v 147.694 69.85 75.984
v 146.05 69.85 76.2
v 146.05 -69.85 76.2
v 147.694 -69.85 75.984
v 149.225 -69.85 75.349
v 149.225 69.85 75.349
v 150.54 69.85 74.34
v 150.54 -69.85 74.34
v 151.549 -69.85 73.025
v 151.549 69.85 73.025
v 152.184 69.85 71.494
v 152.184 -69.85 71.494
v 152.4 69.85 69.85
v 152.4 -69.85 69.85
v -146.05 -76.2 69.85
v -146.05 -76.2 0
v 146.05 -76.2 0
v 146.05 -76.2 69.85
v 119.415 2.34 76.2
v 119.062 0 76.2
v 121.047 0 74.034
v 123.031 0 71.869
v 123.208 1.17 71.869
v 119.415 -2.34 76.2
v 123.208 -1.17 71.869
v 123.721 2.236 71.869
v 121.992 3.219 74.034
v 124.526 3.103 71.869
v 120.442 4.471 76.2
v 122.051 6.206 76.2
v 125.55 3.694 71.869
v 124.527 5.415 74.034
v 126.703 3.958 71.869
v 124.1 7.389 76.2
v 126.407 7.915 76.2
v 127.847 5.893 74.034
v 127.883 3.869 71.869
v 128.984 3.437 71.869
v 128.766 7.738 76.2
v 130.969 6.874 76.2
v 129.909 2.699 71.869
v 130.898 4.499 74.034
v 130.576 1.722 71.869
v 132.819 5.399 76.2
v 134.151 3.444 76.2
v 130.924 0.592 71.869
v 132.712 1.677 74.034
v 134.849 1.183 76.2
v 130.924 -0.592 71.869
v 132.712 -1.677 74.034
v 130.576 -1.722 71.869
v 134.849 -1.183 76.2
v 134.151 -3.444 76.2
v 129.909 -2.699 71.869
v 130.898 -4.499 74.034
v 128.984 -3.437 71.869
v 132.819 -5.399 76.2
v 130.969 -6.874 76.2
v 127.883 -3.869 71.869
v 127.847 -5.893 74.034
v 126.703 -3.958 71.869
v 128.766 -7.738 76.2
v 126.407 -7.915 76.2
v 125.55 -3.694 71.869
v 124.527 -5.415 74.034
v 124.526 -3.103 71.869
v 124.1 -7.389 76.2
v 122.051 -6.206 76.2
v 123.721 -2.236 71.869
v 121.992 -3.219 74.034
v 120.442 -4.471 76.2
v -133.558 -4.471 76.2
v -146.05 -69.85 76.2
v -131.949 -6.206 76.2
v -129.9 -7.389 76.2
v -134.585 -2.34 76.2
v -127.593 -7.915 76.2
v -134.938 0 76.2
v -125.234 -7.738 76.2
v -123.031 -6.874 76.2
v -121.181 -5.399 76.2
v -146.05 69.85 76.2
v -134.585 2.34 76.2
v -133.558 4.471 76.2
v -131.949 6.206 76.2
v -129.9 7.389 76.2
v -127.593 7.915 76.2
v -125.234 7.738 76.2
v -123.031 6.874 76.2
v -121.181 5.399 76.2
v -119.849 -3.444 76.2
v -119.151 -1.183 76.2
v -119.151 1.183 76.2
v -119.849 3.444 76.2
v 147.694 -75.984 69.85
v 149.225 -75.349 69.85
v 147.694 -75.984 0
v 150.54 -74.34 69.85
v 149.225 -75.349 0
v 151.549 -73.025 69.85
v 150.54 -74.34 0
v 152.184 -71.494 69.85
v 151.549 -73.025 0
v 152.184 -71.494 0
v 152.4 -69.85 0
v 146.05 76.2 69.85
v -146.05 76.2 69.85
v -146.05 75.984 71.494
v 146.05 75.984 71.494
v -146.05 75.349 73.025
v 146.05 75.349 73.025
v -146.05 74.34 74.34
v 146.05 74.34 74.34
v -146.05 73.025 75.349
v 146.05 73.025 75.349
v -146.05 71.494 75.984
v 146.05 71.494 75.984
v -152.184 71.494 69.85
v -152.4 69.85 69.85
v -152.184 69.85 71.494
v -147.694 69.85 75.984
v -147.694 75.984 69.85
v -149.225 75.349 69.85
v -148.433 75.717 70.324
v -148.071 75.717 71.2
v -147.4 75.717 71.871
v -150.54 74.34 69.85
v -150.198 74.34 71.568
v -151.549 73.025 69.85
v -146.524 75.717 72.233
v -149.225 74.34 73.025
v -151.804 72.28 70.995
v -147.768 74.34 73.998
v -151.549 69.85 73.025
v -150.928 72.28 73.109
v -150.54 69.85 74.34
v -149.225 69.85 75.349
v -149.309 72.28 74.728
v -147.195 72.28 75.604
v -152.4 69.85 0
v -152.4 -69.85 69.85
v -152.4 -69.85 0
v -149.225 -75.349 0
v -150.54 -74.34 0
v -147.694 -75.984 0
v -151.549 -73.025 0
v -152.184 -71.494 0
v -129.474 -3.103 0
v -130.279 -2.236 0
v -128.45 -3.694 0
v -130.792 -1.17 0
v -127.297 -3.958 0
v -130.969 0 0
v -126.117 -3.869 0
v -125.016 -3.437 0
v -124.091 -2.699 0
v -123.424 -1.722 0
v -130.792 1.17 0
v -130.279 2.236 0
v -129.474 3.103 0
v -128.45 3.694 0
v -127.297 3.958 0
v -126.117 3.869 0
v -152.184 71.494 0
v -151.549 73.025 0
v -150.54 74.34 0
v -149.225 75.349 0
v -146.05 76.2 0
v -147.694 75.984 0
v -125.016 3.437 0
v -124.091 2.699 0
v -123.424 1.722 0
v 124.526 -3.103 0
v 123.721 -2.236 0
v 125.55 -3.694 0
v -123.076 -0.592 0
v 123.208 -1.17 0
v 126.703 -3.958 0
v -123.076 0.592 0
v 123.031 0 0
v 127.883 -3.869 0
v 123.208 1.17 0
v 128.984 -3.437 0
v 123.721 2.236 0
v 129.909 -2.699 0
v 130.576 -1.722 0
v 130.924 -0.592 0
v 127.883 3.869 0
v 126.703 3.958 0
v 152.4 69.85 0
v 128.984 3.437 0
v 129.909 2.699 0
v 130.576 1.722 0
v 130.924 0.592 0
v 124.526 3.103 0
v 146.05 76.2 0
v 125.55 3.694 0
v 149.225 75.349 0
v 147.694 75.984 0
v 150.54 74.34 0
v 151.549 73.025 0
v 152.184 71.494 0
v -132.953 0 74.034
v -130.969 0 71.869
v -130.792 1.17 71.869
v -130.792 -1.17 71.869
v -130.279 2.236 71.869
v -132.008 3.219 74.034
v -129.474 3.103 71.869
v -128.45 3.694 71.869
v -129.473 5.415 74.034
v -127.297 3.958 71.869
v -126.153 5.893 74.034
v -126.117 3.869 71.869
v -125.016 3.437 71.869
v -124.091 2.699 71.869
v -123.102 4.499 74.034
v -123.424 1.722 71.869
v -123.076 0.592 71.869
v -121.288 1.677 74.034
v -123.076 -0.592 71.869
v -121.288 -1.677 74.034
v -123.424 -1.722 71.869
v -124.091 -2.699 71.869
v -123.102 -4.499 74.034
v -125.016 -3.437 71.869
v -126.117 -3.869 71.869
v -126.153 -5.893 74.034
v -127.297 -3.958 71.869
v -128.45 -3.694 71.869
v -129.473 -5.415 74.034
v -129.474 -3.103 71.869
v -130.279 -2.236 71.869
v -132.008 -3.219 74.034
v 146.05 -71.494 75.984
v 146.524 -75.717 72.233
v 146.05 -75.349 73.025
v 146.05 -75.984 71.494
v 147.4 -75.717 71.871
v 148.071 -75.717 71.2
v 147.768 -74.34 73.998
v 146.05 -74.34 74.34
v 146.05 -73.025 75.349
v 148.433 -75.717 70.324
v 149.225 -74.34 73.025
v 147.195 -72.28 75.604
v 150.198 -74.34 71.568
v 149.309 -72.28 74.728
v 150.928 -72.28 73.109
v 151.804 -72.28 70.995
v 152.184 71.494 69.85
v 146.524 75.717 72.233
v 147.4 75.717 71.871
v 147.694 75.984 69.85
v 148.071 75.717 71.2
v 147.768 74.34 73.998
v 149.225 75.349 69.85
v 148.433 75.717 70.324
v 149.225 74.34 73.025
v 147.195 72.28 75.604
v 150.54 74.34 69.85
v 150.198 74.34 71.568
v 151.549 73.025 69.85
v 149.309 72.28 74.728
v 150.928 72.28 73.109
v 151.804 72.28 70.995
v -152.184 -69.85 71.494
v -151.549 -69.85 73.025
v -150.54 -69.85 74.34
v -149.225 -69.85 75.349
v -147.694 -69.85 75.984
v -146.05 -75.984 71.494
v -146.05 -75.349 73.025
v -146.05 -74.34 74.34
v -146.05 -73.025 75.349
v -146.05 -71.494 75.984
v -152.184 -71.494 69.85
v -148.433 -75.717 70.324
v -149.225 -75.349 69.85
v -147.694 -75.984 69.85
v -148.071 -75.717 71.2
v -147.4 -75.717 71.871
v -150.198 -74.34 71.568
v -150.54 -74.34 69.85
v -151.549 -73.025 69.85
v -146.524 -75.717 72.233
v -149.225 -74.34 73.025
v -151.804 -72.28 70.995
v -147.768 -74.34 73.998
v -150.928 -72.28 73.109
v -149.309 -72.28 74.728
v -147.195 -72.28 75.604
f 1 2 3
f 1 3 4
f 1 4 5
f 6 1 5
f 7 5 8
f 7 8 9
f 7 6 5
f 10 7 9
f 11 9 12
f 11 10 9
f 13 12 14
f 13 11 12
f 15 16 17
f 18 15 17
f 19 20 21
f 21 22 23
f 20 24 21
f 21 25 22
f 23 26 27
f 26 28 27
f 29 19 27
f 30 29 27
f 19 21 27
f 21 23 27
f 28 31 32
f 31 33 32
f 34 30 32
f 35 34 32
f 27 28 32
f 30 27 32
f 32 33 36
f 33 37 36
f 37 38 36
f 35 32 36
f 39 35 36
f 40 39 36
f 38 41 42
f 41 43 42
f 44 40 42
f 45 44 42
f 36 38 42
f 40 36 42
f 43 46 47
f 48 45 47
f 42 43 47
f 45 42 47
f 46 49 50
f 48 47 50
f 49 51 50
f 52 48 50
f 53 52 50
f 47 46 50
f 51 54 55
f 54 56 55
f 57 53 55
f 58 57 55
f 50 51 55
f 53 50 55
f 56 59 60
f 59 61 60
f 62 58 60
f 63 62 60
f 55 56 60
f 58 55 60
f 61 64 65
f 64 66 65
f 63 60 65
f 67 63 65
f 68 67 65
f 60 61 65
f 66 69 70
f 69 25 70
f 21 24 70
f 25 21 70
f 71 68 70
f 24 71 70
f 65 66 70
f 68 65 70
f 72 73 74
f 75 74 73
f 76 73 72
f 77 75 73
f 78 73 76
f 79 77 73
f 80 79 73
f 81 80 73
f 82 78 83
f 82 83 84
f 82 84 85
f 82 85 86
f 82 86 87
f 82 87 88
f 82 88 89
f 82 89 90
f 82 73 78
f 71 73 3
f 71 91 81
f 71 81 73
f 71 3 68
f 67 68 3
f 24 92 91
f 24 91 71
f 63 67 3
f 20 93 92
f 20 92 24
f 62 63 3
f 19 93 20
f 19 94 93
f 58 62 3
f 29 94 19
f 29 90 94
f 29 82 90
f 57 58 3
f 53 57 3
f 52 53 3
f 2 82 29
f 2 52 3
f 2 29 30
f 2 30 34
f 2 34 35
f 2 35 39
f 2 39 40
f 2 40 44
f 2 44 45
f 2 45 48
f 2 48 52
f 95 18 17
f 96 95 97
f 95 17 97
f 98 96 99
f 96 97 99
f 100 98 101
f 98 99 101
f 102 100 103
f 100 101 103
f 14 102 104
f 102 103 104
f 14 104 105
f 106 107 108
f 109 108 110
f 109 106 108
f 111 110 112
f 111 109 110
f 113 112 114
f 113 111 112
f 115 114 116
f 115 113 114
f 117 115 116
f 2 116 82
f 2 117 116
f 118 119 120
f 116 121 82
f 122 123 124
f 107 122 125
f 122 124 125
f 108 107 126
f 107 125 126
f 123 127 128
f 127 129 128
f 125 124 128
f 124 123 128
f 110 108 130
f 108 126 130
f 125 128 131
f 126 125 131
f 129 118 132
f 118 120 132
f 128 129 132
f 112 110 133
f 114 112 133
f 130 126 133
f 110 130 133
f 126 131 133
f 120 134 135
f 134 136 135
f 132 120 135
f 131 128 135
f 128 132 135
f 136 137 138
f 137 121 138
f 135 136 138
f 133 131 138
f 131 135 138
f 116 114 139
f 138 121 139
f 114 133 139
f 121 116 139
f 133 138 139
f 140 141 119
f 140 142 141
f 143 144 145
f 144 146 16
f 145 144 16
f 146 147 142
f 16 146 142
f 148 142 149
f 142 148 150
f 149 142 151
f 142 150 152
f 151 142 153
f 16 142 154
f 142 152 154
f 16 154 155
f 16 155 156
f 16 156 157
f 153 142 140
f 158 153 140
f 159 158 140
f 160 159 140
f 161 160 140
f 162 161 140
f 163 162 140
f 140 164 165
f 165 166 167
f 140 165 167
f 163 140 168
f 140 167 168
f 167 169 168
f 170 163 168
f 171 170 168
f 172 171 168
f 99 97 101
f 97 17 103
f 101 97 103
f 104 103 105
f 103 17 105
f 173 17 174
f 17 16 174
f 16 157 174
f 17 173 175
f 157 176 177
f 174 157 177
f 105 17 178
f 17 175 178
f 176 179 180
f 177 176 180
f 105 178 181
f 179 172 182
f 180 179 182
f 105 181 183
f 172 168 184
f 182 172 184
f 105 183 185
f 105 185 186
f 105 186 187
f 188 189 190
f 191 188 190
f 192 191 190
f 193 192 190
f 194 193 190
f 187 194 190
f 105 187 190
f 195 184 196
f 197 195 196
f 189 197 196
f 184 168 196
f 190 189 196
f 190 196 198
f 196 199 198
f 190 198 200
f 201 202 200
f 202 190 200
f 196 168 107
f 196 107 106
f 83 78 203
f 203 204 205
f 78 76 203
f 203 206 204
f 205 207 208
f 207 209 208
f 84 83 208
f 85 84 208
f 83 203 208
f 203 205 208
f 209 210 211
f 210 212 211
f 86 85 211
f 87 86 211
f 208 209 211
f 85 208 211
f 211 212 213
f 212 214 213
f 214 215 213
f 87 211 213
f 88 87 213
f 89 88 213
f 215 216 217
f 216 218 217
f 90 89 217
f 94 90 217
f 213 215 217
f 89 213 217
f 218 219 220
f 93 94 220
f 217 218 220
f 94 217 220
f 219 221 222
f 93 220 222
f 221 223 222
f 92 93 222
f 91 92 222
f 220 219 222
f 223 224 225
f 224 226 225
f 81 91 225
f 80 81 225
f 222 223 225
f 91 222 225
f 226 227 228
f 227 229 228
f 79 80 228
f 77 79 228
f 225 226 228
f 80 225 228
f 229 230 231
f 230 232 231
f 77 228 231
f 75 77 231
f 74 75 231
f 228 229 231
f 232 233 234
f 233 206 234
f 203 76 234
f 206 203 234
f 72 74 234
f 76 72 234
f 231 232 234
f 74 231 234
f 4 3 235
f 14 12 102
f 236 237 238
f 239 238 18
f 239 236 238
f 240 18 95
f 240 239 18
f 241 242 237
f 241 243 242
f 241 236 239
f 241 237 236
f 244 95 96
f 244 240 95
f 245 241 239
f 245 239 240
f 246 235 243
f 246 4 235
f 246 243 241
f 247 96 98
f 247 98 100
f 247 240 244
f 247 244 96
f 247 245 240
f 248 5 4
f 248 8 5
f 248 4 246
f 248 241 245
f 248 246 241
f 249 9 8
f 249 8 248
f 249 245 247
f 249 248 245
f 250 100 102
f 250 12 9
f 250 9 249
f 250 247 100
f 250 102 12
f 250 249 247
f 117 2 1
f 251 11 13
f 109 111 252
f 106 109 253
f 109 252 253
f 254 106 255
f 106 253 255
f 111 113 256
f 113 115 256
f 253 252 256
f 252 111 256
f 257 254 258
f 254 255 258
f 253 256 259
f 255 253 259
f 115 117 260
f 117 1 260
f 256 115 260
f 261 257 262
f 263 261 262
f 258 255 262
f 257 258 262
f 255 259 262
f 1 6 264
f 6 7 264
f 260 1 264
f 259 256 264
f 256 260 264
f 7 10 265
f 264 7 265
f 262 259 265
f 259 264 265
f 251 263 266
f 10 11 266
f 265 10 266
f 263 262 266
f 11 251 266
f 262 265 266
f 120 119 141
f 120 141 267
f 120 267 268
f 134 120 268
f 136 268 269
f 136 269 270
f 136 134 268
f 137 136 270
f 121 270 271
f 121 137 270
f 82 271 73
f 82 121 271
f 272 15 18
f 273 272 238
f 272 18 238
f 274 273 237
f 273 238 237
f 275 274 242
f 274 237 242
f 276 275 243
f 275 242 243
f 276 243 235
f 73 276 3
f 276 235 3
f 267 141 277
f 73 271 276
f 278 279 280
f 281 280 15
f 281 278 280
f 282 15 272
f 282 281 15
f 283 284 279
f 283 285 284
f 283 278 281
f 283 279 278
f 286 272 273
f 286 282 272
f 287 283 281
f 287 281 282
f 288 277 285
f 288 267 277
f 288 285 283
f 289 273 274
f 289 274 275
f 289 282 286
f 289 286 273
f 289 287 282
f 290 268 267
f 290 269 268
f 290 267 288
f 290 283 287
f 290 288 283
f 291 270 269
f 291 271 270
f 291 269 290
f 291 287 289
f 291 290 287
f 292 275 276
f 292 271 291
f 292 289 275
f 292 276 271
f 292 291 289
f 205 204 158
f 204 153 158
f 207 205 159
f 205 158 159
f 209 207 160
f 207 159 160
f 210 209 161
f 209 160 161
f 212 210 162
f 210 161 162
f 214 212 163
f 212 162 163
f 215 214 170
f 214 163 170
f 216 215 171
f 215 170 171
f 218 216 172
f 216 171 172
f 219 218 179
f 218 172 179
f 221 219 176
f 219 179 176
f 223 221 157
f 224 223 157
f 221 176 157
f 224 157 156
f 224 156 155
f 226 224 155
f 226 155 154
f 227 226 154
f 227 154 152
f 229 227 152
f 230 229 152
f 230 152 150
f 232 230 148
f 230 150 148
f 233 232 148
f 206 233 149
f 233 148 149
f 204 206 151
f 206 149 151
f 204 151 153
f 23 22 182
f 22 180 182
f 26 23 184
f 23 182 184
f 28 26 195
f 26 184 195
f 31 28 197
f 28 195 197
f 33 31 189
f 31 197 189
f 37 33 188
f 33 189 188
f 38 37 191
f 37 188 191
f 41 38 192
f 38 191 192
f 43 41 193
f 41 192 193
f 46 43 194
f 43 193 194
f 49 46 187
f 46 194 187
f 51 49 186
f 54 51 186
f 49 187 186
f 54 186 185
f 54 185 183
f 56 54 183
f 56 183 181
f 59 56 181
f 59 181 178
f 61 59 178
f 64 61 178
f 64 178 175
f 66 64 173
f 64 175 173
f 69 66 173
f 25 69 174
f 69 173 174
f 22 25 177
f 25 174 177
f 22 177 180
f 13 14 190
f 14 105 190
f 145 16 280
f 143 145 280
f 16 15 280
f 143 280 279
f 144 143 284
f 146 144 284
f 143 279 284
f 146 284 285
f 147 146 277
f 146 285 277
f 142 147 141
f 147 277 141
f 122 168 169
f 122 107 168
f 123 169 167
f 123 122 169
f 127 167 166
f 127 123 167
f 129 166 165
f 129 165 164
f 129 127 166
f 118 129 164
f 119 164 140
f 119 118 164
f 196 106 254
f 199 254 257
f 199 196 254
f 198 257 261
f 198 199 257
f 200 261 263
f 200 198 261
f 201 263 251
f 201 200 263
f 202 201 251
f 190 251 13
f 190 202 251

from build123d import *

# Parameters (mm, degrees)
F0_W           = 304.8
F0_H           = 152.4
F1_DEPTH       = 76.2
F3_D           = 7.9375
F3_CSINK_D     = 15.875
F3_CSINK_ANGLE = 85
F4_R           = 6.35
F5_R           = 6.35


with BuildPart() as f1:
    # F0 (on Top) → F1 (new body)
    with BuildSketch(Plane.XY):
        Rectangle(F0_W, F0_H)
    extrude(amount=F1_DEPTH)

    # F3 (through all)
    with Locations(Plane.XY.offset(76.2)):
        with Locations((-127, 0), (127, 0)):
            CounterSinkHole(F3_D / 2, F3_CSINK_D / 2, counter_sink_angle=F3_CSINK_ANGLE)

    # F4
    f4_edges = [f1.edges().sort_by_distance(p)[0] for p in [
        (-152.4, 0, 76.2),
        (152.4, 0, 76.2),
    ]]
    fillet(f4_edges, radius=F4_R)

    # F5
    f5_edges = [f1.edges().sort_by_distance(p)[0] for p in [
        (0, -76.2, 76.2),
        (0, 76.2, 76.2),
    ]]
    fillet(f5_edges, radius=F5_R)


solid = f1.part
